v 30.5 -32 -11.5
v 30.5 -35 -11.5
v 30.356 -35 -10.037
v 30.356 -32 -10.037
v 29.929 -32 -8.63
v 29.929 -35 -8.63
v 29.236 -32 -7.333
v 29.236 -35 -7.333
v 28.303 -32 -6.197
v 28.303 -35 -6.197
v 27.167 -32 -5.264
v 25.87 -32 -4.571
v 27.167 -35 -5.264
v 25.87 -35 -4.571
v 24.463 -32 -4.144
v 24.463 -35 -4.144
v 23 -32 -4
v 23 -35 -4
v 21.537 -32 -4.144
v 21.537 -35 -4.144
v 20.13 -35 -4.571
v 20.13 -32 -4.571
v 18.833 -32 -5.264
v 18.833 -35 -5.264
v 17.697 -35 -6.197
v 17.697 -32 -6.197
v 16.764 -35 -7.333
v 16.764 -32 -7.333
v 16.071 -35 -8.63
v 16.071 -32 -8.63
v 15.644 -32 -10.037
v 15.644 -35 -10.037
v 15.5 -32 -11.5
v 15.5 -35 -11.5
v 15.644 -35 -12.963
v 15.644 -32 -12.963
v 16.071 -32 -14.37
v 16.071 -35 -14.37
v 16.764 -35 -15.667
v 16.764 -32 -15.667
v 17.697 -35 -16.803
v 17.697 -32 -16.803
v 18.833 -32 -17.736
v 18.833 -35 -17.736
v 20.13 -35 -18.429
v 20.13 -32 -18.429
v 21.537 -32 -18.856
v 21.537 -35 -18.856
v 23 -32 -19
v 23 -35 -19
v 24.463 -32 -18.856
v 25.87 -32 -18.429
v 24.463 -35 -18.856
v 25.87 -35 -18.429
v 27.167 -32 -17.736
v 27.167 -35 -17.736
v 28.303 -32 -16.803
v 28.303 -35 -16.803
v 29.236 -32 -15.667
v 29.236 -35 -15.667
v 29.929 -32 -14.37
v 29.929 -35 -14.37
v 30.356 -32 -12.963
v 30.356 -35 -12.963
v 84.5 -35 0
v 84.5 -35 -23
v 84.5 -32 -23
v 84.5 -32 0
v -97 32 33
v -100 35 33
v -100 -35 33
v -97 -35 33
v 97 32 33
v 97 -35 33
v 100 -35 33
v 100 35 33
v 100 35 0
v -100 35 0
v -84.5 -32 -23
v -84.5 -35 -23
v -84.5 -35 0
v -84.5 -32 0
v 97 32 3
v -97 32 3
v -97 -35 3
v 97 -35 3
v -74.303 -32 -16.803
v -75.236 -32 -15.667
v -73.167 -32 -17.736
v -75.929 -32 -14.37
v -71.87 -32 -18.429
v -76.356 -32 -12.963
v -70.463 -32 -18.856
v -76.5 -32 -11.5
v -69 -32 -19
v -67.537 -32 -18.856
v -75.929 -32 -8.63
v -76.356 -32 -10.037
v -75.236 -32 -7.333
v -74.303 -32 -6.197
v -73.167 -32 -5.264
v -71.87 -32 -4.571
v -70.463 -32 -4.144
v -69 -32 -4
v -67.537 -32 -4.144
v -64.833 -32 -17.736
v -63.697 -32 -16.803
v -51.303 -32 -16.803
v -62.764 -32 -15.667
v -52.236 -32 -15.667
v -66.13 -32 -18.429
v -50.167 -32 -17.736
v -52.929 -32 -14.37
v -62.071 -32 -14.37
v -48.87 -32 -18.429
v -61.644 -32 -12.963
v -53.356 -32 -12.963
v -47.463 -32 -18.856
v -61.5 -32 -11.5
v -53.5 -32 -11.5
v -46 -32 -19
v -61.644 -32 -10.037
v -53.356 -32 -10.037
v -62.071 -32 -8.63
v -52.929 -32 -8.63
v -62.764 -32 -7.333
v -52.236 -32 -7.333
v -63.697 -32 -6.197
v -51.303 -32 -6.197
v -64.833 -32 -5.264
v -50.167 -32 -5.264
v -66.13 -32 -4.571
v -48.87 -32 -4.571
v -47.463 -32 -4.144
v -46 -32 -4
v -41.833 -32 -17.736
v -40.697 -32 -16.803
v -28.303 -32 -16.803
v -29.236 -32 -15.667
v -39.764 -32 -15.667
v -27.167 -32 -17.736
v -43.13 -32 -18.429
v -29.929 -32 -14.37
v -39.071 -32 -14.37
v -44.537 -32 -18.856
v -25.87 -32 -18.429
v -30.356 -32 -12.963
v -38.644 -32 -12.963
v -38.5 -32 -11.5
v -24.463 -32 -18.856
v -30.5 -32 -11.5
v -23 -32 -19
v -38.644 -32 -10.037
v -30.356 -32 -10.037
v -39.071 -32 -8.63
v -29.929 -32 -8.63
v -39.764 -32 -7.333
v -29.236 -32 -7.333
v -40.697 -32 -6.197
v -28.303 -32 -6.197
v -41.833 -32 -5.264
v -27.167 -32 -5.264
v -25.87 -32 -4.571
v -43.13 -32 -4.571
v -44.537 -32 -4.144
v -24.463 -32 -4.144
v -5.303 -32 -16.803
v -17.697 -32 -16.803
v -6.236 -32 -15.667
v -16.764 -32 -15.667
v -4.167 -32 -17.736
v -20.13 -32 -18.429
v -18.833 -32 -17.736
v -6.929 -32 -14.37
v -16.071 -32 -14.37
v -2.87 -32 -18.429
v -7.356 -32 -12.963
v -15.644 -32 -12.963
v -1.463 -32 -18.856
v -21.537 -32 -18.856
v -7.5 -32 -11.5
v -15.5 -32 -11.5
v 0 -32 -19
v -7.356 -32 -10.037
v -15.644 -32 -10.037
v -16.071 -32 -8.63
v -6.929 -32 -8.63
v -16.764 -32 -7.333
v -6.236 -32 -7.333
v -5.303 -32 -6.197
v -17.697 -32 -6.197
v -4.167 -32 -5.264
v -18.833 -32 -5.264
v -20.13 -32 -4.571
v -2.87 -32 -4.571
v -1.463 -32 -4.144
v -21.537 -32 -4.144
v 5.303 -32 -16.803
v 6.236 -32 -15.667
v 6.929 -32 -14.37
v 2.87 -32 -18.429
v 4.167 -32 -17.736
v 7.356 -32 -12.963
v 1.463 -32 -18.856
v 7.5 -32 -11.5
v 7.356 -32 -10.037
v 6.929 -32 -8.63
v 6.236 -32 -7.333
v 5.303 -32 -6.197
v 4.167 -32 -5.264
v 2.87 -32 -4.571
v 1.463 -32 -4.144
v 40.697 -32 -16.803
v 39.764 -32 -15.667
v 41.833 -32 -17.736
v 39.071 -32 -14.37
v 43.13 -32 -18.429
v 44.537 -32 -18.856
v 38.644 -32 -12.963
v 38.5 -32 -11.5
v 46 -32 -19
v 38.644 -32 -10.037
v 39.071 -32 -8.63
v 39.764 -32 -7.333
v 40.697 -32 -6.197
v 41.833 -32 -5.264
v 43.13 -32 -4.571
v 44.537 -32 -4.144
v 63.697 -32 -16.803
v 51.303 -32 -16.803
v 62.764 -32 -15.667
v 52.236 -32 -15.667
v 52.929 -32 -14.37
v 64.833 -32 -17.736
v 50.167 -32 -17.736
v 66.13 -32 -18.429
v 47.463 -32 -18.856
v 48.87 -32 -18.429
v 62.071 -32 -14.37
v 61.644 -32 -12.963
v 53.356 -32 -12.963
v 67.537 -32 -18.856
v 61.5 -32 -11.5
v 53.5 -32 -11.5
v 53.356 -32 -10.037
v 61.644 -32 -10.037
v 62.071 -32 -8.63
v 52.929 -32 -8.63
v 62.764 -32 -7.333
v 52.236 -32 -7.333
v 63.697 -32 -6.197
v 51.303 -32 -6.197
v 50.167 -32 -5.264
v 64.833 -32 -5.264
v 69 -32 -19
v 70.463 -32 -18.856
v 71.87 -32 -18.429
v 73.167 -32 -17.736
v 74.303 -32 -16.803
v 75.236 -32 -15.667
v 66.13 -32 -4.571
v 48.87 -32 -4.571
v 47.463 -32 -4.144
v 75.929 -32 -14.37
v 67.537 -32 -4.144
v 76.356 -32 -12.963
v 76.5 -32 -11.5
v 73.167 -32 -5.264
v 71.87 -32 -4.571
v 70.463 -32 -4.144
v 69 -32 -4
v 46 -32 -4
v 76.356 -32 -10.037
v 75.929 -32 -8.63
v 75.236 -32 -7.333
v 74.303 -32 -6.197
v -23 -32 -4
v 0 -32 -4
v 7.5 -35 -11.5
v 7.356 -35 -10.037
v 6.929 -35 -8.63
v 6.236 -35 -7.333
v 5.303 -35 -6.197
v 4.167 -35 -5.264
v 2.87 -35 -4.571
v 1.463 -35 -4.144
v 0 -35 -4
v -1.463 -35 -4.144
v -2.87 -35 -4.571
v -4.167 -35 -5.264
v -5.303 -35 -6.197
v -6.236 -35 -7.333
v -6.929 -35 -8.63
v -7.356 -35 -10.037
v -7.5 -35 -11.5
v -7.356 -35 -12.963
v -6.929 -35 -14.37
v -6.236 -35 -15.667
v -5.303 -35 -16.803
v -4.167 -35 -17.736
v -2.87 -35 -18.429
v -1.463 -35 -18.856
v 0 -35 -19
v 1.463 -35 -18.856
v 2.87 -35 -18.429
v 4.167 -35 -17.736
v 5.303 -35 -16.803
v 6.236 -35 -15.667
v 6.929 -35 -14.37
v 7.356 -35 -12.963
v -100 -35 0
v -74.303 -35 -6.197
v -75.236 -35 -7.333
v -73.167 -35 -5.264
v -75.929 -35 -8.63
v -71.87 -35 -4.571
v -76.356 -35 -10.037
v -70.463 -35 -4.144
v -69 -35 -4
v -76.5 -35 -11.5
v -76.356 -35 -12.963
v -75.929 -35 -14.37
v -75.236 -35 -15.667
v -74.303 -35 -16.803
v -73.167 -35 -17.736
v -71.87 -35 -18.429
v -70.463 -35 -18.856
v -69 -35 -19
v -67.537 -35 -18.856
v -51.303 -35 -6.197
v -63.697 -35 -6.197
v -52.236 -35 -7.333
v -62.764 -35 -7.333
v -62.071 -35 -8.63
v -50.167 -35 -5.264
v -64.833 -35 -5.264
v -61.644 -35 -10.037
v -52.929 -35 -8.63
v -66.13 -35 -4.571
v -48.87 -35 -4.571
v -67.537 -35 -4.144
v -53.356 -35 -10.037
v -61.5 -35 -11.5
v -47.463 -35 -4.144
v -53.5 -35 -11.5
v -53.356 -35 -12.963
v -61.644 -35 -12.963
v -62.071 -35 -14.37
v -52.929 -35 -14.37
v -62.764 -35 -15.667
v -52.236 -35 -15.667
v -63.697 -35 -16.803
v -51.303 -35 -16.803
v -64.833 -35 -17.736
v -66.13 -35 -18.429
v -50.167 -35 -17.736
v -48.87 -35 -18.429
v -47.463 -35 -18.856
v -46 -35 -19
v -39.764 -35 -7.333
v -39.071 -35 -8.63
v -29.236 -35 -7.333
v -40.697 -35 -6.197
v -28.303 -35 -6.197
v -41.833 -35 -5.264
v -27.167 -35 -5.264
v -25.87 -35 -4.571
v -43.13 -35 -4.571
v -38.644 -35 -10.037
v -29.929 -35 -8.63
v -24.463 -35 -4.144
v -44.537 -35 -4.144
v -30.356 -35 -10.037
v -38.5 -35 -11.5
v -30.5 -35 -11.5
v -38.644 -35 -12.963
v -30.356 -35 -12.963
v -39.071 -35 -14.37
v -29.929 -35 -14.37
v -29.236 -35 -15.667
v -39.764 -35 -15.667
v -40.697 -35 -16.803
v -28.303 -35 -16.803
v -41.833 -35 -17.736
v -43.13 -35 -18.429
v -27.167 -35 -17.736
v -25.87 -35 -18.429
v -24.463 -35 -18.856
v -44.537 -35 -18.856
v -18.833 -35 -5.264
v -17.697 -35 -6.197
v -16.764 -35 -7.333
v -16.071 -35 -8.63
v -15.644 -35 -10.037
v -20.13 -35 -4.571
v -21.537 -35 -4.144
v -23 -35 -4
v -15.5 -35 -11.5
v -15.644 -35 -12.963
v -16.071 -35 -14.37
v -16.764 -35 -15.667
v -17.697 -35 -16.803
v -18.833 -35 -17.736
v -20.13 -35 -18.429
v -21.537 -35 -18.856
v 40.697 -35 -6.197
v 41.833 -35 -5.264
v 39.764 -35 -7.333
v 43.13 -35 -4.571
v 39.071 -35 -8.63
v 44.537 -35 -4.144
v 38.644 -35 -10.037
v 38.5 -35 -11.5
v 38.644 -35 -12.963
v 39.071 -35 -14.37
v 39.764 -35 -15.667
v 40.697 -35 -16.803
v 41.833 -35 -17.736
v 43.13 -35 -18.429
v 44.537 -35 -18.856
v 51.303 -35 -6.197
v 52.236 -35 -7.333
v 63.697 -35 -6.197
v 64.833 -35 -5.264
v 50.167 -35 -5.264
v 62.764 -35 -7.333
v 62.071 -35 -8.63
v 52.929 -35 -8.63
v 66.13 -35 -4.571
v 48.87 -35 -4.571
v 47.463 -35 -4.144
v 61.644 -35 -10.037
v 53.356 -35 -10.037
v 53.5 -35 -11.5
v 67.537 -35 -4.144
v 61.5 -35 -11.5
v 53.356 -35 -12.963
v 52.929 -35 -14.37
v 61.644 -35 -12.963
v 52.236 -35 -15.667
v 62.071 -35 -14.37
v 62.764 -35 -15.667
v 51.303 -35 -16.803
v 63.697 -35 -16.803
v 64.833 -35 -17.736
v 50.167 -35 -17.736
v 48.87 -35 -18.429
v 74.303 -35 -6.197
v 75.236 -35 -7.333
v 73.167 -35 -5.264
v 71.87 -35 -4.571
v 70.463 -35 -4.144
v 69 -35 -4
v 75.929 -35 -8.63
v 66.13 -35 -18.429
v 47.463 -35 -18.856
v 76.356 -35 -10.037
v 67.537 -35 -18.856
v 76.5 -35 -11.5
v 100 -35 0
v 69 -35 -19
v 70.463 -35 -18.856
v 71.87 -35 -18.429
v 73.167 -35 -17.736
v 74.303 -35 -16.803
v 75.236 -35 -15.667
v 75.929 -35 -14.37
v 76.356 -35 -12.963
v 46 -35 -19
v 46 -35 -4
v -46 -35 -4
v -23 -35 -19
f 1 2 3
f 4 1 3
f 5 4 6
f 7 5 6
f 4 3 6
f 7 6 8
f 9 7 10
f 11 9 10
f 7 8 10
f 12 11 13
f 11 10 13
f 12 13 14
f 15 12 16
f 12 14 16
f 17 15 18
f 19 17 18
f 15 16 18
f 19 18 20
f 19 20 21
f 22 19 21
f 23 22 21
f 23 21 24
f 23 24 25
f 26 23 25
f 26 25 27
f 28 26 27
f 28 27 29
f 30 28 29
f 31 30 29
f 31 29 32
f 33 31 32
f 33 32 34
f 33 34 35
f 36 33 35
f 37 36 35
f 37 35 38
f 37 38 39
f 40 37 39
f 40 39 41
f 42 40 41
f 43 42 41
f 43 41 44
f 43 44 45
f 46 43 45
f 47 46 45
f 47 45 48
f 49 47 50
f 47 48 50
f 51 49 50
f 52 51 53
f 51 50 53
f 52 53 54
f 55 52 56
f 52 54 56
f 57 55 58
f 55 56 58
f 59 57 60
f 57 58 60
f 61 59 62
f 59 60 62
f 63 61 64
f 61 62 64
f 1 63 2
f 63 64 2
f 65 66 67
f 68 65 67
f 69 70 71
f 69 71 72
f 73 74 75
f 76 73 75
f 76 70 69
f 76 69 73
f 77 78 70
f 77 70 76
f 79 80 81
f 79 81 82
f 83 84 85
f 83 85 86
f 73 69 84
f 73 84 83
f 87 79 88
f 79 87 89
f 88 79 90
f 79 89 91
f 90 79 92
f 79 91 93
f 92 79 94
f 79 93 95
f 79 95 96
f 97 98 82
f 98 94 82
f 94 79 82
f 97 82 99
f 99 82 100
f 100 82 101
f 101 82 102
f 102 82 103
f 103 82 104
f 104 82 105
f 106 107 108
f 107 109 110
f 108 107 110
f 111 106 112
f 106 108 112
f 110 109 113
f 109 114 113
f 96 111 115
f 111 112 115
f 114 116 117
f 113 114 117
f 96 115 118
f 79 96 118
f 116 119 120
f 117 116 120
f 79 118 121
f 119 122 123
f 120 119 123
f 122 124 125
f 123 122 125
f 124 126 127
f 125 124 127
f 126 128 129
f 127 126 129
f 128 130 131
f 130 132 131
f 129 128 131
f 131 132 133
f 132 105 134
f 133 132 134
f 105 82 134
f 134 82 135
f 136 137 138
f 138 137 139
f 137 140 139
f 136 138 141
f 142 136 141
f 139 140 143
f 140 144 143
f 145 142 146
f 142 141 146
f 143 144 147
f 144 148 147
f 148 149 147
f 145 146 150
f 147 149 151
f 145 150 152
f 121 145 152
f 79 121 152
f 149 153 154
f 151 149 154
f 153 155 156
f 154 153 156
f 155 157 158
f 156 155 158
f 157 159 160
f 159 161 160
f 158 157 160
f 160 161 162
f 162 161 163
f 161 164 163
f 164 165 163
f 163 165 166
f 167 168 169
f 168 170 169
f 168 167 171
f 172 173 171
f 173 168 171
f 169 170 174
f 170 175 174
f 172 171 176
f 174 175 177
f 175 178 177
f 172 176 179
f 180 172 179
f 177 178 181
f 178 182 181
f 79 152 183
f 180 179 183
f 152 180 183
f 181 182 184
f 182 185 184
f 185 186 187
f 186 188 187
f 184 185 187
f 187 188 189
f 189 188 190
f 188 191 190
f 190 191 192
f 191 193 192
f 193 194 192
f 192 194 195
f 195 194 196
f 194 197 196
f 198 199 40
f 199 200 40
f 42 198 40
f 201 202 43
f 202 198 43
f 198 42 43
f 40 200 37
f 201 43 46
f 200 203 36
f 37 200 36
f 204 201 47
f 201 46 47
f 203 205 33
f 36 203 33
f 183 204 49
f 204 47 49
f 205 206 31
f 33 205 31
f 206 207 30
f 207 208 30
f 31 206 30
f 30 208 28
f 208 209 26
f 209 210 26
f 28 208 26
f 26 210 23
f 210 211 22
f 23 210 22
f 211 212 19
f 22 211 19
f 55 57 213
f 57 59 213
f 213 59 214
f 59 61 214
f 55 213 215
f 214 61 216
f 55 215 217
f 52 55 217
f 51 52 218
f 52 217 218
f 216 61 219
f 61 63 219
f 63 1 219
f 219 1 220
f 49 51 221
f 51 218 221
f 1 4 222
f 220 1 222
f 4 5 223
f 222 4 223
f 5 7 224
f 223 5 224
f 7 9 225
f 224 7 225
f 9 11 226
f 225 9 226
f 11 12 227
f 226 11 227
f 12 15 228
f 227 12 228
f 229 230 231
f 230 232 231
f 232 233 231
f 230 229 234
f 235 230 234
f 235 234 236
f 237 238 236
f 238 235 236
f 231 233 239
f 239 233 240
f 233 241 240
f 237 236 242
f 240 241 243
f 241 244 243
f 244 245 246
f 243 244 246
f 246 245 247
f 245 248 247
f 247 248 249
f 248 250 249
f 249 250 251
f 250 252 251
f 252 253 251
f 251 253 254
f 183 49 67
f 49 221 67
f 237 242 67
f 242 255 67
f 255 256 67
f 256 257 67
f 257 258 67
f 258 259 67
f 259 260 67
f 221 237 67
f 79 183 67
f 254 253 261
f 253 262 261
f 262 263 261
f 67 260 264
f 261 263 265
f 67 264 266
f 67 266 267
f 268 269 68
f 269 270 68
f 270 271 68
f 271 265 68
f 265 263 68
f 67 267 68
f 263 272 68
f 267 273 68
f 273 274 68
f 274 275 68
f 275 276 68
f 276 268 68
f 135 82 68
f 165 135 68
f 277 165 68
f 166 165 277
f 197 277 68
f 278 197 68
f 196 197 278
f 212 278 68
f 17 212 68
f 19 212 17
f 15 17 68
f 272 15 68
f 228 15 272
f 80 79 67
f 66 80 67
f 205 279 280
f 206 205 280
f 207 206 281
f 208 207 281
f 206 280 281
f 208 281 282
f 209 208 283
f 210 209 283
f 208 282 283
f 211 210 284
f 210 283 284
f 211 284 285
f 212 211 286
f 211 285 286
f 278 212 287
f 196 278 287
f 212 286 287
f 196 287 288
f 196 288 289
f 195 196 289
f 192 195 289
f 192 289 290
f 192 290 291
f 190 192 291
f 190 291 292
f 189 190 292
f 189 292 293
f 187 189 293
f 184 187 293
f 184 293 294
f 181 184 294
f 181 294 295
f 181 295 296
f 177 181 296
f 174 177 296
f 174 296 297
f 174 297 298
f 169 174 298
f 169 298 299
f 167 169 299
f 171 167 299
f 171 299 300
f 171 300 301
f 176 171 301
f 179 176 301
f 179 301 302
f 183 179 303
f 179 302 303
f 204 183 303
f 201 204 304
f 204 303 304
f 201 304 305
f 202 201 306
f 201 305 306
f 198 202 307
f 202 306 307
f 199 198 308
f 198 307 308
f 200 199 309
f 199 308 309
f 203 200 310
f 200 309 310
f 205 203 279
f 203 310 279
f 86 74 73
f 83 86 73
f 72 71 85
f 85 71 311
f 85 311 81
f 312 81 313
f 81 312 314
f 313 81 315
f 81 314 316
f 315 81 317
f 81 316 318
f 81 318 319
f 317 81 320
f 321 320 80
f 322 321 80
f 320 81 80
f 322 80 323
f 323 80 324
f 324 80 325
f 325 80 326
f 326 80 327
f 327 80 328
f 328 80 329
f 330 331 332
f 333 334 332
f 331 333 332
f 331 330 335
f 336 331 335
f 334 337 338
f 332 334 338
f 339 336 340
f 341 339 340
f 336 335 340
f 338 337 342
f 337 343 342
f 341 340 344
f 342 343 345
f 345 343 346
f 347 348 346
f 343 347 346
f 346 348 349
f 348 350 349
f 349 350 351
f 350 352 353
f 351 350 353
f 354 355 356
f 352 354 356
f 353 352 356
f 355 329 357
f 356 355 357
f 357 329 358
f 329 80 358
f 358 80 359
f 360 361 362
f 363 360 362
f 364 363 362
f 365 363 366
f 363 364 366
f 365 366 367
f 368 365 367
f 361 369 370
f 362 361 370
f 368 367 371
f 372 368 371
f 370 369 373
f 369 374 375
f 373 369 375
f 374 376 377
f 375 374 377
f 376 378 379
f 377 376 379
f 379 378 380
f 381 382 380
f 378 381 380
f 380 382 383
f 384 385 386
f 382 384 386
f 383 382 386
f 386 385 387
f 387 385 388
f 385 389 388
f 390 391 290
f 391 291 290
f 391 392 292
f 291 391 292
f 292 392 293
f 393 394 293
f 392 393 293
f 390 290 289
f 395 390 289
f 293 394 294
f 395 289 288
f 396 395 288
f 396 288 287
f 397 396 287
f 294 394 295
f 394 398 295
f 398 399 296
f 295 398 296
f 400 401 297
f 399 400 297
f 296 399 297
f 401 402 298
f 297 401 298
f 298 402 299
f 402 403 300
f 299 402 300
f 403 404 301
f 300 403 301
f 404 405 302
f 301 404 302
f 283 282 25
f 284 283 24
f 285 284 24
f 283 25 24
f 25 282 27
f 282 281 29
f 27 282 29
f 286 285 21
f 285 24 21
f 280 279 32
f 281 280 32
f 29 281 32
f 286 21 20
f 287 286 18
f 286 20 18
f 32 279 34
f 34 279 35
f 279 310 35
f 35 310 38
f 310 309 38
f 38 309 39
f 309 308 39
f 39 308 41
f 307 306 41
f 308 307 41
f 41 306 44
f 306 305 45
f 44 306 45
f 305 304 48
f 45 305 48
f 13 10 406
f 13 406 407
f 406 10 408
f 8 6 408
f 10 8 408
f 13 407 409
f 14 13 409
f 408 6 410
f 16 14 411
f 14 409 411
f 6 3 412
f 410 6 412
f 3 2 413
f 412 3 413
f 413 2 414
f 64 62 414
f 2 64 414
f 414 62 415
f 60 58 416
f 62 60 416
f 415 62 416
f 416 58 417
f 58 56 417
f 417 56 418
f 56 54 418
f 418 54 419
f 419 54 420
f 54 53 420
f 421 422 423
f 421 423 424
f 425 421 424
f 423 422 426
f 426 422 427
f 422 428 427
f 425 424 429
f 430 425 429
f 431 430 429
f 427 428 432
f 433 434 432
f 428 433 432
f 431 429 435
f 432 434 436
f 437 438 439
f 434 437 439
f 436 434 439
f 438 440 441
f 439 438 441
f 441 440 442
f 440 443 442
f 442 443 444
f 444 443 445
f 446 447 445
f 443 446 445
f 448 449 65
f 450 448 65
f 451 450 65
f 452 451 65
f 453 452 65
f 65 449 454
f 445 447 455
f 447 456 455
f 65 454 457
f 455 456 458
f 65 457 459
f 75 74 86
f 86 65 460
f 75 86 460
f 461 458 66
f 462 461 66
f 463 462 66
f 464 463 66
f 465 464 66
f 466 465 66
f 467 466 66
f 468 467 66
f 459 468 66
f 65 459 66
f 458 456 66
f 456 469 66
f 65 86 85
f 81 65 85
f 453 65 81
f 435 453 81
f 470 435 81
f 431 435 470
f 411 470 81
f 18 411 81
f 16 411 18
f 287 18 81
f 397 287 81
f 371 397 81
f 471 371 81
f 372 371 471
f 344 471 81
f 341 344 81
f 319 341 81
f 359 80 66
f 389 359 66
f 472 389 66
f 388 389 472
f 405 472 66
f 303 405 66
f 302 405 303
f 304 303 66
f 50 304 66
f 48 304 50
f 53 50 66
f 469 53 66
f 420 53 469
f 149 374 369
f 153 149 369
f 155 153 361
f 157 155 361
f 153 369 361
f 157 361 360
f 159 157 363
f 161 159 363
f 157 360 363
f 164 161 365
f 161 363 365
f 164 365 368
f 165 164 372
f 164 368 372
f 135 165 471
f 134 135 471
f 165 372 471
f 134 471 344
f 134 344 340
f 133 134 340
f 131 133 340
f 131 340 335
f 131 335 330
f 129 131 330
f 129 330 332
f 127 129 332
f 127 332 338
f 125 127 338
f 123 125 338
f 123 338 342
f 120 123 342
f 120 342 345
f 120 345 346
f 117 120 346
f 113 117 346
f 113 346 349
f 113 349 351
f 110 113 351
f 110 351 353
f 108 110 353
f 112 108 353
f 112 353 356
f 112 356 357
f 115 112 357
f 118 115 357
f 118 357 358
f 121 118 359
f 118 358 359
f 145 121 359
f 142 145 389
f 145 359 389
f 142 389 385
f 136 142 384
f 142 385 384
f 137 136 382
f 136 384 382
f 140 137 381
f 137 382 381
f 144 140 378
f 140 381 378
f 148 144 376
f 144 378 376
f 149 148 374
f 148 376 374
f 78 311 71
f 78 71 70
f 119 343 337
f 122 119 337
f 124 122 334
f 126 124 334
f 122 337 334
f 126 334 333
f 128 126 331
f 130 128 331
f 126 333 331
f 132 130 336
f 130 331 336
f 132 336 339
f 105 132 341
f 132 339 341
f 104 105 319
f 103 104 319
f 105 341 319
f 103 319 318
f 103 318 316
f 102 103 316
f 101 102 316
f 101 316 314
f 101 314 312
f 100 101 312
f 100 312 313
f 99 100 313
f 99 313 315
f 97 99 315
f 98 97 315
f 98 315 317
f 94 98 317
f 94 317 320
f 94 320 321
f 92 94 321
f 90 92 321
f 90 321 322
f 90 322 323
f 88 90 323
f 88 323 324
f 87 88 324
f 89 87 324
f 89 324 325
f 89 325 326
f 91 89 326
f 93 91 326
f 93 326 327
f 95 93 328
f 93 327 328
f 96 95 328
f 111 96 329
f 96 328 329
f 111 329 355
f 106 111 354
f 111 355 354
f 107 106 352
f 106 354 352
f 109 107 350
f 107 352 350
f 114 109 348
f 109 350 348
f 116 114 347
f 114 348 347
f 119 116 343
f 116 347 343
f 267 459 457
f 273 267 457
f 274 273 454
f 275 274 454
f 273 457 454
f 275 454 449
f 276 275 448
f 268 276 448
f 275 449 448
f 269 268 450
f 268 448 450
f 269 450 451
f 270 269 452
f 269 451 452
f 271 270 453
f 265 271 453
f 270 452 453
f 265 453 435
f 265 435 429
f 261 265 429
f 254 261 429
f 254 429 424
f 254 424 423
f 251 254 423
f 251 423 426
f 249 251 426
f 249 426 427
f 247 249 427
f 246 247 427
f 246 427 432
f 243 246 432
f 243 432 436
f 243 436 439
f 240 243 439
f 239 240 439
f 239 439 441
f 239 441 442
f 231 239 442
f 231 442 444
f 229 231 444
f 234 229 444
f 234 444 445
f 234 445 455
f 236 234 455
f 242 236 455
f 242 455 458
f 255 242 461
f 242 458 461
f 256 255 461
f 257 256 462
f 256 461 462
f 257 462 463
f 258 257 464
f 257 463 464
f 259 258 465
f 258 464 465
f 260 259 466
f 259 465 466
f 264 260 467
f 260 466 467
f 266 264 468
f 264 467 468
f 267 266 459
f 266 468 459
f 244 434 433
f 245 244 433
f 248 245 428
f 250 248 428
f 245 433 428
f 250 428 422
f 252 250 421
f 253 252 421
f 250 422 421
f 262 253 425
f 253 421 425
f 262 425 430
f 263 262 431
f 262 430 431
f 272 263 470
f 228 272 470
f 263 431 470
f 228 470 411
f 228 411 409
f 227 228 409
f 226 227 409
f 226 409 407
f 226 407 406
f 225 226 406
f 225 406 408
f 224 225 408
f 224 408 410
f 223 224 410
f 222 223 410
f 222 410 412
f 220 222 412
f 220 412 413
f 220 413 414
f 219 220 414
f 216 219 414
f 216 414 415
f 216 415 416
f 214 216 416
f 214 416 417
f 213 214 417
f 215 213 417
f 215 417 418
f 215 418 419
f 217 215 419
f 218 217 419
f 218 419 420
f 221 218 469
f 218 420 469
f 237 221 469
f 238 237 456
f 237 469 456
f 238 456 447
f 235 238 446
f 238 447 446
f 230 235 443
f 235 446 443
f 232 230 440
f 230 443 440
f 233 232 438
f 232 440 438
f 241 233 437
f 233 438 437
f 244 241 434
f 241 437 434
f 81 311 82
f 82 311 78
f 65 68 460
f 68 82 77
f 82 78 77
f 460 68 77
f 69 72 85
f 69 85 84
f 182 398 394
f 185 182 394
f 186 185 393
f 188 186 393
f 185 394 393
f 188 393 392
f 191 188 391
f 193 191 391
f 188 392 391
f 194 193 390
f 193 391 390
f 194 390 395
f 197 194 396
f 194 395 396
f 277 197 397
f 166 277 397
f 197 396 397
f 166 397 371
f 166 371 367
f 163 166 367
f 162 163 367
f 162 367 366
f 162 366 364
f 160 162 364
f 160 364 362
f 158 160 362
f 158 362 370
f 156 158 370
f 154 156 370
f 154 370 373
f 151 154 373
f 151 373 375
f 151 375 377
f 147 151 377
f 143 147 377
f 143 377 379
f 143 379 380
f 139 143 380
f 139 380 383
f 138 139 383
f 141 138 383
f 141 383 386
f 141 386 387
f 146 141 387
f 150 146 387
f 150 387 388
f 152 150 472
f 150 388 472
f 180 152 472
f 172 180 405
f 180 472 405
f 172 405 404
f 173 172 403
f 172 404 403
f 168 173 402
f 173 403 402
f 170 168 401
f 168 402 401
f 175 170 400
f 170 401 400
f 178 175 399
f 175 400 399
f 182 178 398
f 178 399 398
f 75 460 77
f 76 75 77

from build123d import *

# Parameters (mm, degrees)
SKETCH_W        = 200
SKETCH_H        = 70
PAD_DEPTH       = 33
SKETCH001_W     = 194
SKETCH001_H     = 67
POCKET_DEPTH    = 30
SKETCH002_W     = 169
SKETCH002_H     = 3
PAD001_DEPTH    = 23
SKETCH004_R     = 7.5
POCKET001_DEPTH = 5


with BuildPart() as part:
    # Sketch → Pad (new body)
    with BuildSketch(Plane.XY):
        Rectangle(SKETCH_W, SKETCH_H)
    extrude(amount=PAD_DEPTH)

    # Sketch001 (on Face6 of Pad) → Pocket (cut)
    with BuildSketch(Plane.XY.offset(33)):
        with Locations((0, -1.5)):
            Rectangle(SKETCH001_W, SKETCH001_H)
    extrude(amount=-POCKET_DEPTH, mode=Mode.SUBTRACT)

    # Sketch002 → Pad001 (join)
    with BuildSketch(Plane.XY):
        with Locations((0, -33.5)):
            Rectangle(SKETCH002_W, SKETCH002_H)
    extrude(amount=-PAD001_DEPTH)

    # Sketch004 (on Face14 of Pad001) → Pocket001 (cut)
    with BuildSketch(Plane.XZ.offset(35)):
        with Locations((0, -11.5)):
            Circle(SKETCH004_R)
        with Locations((-23, -11.5)):
            Circle(SKETCH004_R)
        with Locations((23, -11.5)):
            Circle(SKETCH004_R)
        with Locations((46, -11.5)):
            Circle(SKETCH004_R)
        with Locations((69, -11.5)):
            Circle(SKETCH004_R)
        with Locations((-46, -11.5)):
            Circle(SKETCH004_R)
        with Locations((-69, -11.5)):
            Circle(SKETCH004_R)
    extrude(amount=-POCKET001_DEPTH, mode=Mode.SUBTRACT)


solid = part.part
